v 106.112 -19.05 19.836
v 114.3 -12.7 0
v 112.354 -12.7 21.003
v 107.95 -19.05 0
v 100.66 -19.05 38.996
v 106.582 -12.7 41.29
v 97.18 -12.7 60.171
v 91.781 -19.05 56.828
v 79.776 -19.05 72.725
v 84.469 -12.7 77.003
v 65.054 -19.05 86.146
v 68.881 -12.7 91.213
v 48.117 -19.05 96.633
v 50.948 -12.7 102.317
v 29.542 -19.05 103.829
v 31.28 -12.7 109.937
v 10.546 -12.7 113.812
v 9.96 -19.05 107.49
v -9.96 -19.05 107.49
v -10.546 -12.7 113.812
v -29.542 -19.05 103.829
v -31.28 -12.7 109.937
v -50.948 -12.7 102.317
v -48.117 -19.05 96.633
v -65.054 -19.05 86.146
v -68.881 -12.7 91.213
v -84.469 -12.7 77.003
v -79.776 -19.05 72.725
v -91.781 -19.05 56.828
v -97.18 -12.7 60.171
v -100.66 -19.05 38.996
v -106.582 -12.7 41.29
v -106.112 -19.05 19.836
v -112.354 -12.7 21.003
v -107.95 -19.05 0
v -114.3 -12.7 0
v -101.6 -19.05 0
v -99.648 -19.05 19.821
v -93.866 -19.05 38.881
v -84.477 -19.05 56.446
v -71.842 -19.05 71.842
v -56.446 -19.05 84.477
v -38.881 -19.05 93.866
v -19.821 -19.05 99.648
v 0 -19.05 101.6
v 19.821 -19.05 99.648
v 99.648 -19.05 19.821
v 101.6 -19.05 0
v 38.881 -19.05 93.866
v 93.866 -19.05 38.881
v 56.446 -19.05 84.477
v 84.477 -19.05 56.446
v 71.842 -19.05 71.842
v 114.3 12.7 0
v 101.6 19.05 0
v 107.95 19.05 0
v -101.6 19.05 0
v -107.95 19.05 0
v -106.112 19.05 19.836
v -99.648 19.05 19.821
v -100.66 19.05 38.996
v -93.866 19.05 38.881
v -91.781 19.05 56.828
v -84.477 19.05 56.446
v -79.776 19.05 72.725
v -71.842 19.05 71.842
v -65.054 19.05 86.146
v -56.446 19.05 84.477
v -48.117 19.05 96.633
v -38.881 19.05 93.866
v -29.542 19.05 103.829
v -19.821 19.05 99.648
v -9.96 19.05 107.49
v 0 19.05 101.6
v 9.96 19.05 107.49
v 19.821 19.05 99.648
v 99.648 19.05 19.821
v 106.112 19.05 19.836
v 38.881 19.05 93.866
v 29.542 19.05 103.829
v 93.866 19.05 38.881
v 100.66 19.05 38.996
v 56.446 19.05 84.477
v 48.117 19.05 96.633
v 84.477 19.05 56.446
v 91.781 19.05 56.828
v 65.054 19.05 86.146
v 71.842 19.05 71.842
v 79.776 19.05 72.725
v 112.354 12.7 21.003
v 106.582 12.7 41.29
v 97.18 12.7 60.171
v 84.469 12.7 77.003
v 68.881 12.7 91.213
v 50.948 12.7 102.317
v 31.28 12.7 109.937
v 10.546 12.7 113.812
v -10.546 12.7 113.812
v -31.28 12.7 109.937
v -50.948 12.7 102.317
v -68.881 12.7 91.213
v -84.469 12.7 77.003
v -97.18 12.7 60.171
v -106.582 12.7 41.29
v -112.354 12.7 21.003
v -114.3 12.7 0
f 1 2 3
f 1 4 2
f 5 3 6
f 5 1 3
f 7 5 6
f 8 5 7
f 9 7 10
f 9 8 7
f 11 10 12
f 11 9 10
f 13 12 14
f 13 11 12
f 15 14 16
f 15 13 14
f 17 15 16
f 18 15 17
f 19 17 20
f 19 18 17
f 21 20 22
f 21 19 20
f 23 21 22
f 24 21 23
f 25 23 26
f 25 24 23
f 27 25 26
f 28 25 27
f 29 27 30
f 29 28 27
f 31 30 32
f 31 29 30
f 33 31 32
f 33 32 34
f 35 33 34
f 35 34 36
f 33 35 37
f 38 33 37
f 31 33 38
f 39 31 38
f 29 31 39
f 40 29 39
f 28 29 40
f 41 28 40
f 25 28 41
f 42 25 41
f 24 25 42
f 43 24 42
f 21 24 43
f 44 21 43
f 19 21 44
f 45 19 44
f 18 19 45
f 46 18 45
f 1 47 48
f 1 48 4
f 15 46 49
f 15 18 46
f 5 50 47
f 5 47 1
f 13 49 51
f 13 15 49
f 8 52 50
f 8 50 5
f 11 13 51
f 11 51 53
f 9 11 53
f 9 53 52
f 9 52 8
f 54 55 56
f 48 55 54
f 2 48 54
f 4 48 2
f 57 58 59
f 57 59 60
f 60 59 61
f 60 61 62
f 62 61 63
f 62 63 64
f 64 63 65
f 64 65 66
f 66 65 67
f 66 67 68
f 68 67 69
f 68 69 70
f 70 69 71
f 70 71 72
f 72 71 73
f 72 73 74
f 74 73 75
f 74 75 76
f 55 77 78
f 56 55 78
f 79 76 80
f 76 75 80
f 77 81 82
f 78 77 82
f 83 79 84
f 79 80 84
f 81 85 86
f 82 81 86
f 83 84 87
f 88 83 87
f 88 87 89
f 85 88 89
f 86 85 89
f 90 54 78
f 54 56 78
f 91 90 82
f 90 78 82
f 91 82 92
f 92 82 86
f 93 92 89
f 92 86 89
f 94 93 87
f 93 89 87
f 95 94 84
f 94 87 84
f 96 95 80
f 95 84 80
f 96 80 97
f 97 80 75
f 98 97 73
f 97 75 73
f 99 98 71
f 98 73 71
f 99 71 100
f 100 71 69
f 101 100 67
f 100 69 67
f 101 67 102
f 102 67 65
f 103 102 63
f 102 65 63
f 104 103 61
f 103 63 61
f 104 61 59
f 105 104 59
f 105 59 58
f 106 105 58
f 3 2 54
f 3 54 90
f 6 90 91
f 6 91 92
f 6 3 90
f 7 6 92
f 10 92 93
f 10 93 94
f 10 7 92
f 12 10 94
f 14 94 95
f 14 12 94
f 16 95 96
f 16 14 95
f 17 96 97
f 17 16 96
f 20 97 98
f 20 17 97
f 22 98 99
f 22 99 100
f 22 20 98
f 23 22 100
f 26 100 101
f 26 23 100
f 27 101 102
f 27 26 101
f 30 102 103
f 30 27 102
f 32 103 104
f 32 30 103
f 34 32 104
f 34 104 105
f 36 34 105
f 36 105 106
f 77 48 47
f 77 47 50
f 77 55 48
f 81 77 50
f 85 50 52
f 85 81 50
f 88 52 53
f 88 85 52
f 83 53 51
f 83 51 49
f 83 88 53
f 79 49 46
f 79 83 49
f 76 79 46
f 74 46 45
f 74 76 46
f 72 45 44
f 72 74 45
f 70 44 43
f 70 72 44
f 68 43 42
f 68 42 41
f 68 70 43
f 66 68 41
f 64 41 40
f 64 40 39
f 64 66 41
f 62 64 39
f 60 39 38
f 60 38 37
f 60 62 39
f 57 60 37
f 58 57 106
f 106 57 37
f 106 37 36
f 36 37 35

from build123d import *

# Parameters (mm, degrees)
F1_ANGLE = 180


with BuildPart() as f1:
    # F0 (on Top) → F1 (revolve)
    with BuildSketch(Plane.XY):
        Polygon((107.95, 19.05), (101.6, 19.05), (101.6, 0), (114.3, 0), (114.3, 12.7), align=None)
    revolve(axis=Axis((0, 5.0604422272, 0), (0, -1, 0)), revolution_arc=F1_ANGLE)

    # F2: F1 across plane


with BuildPart() as f1_1:
    add(f1.part)
    add(f1.part.mirror(Plane.XZ))


solid = f1_1.part
